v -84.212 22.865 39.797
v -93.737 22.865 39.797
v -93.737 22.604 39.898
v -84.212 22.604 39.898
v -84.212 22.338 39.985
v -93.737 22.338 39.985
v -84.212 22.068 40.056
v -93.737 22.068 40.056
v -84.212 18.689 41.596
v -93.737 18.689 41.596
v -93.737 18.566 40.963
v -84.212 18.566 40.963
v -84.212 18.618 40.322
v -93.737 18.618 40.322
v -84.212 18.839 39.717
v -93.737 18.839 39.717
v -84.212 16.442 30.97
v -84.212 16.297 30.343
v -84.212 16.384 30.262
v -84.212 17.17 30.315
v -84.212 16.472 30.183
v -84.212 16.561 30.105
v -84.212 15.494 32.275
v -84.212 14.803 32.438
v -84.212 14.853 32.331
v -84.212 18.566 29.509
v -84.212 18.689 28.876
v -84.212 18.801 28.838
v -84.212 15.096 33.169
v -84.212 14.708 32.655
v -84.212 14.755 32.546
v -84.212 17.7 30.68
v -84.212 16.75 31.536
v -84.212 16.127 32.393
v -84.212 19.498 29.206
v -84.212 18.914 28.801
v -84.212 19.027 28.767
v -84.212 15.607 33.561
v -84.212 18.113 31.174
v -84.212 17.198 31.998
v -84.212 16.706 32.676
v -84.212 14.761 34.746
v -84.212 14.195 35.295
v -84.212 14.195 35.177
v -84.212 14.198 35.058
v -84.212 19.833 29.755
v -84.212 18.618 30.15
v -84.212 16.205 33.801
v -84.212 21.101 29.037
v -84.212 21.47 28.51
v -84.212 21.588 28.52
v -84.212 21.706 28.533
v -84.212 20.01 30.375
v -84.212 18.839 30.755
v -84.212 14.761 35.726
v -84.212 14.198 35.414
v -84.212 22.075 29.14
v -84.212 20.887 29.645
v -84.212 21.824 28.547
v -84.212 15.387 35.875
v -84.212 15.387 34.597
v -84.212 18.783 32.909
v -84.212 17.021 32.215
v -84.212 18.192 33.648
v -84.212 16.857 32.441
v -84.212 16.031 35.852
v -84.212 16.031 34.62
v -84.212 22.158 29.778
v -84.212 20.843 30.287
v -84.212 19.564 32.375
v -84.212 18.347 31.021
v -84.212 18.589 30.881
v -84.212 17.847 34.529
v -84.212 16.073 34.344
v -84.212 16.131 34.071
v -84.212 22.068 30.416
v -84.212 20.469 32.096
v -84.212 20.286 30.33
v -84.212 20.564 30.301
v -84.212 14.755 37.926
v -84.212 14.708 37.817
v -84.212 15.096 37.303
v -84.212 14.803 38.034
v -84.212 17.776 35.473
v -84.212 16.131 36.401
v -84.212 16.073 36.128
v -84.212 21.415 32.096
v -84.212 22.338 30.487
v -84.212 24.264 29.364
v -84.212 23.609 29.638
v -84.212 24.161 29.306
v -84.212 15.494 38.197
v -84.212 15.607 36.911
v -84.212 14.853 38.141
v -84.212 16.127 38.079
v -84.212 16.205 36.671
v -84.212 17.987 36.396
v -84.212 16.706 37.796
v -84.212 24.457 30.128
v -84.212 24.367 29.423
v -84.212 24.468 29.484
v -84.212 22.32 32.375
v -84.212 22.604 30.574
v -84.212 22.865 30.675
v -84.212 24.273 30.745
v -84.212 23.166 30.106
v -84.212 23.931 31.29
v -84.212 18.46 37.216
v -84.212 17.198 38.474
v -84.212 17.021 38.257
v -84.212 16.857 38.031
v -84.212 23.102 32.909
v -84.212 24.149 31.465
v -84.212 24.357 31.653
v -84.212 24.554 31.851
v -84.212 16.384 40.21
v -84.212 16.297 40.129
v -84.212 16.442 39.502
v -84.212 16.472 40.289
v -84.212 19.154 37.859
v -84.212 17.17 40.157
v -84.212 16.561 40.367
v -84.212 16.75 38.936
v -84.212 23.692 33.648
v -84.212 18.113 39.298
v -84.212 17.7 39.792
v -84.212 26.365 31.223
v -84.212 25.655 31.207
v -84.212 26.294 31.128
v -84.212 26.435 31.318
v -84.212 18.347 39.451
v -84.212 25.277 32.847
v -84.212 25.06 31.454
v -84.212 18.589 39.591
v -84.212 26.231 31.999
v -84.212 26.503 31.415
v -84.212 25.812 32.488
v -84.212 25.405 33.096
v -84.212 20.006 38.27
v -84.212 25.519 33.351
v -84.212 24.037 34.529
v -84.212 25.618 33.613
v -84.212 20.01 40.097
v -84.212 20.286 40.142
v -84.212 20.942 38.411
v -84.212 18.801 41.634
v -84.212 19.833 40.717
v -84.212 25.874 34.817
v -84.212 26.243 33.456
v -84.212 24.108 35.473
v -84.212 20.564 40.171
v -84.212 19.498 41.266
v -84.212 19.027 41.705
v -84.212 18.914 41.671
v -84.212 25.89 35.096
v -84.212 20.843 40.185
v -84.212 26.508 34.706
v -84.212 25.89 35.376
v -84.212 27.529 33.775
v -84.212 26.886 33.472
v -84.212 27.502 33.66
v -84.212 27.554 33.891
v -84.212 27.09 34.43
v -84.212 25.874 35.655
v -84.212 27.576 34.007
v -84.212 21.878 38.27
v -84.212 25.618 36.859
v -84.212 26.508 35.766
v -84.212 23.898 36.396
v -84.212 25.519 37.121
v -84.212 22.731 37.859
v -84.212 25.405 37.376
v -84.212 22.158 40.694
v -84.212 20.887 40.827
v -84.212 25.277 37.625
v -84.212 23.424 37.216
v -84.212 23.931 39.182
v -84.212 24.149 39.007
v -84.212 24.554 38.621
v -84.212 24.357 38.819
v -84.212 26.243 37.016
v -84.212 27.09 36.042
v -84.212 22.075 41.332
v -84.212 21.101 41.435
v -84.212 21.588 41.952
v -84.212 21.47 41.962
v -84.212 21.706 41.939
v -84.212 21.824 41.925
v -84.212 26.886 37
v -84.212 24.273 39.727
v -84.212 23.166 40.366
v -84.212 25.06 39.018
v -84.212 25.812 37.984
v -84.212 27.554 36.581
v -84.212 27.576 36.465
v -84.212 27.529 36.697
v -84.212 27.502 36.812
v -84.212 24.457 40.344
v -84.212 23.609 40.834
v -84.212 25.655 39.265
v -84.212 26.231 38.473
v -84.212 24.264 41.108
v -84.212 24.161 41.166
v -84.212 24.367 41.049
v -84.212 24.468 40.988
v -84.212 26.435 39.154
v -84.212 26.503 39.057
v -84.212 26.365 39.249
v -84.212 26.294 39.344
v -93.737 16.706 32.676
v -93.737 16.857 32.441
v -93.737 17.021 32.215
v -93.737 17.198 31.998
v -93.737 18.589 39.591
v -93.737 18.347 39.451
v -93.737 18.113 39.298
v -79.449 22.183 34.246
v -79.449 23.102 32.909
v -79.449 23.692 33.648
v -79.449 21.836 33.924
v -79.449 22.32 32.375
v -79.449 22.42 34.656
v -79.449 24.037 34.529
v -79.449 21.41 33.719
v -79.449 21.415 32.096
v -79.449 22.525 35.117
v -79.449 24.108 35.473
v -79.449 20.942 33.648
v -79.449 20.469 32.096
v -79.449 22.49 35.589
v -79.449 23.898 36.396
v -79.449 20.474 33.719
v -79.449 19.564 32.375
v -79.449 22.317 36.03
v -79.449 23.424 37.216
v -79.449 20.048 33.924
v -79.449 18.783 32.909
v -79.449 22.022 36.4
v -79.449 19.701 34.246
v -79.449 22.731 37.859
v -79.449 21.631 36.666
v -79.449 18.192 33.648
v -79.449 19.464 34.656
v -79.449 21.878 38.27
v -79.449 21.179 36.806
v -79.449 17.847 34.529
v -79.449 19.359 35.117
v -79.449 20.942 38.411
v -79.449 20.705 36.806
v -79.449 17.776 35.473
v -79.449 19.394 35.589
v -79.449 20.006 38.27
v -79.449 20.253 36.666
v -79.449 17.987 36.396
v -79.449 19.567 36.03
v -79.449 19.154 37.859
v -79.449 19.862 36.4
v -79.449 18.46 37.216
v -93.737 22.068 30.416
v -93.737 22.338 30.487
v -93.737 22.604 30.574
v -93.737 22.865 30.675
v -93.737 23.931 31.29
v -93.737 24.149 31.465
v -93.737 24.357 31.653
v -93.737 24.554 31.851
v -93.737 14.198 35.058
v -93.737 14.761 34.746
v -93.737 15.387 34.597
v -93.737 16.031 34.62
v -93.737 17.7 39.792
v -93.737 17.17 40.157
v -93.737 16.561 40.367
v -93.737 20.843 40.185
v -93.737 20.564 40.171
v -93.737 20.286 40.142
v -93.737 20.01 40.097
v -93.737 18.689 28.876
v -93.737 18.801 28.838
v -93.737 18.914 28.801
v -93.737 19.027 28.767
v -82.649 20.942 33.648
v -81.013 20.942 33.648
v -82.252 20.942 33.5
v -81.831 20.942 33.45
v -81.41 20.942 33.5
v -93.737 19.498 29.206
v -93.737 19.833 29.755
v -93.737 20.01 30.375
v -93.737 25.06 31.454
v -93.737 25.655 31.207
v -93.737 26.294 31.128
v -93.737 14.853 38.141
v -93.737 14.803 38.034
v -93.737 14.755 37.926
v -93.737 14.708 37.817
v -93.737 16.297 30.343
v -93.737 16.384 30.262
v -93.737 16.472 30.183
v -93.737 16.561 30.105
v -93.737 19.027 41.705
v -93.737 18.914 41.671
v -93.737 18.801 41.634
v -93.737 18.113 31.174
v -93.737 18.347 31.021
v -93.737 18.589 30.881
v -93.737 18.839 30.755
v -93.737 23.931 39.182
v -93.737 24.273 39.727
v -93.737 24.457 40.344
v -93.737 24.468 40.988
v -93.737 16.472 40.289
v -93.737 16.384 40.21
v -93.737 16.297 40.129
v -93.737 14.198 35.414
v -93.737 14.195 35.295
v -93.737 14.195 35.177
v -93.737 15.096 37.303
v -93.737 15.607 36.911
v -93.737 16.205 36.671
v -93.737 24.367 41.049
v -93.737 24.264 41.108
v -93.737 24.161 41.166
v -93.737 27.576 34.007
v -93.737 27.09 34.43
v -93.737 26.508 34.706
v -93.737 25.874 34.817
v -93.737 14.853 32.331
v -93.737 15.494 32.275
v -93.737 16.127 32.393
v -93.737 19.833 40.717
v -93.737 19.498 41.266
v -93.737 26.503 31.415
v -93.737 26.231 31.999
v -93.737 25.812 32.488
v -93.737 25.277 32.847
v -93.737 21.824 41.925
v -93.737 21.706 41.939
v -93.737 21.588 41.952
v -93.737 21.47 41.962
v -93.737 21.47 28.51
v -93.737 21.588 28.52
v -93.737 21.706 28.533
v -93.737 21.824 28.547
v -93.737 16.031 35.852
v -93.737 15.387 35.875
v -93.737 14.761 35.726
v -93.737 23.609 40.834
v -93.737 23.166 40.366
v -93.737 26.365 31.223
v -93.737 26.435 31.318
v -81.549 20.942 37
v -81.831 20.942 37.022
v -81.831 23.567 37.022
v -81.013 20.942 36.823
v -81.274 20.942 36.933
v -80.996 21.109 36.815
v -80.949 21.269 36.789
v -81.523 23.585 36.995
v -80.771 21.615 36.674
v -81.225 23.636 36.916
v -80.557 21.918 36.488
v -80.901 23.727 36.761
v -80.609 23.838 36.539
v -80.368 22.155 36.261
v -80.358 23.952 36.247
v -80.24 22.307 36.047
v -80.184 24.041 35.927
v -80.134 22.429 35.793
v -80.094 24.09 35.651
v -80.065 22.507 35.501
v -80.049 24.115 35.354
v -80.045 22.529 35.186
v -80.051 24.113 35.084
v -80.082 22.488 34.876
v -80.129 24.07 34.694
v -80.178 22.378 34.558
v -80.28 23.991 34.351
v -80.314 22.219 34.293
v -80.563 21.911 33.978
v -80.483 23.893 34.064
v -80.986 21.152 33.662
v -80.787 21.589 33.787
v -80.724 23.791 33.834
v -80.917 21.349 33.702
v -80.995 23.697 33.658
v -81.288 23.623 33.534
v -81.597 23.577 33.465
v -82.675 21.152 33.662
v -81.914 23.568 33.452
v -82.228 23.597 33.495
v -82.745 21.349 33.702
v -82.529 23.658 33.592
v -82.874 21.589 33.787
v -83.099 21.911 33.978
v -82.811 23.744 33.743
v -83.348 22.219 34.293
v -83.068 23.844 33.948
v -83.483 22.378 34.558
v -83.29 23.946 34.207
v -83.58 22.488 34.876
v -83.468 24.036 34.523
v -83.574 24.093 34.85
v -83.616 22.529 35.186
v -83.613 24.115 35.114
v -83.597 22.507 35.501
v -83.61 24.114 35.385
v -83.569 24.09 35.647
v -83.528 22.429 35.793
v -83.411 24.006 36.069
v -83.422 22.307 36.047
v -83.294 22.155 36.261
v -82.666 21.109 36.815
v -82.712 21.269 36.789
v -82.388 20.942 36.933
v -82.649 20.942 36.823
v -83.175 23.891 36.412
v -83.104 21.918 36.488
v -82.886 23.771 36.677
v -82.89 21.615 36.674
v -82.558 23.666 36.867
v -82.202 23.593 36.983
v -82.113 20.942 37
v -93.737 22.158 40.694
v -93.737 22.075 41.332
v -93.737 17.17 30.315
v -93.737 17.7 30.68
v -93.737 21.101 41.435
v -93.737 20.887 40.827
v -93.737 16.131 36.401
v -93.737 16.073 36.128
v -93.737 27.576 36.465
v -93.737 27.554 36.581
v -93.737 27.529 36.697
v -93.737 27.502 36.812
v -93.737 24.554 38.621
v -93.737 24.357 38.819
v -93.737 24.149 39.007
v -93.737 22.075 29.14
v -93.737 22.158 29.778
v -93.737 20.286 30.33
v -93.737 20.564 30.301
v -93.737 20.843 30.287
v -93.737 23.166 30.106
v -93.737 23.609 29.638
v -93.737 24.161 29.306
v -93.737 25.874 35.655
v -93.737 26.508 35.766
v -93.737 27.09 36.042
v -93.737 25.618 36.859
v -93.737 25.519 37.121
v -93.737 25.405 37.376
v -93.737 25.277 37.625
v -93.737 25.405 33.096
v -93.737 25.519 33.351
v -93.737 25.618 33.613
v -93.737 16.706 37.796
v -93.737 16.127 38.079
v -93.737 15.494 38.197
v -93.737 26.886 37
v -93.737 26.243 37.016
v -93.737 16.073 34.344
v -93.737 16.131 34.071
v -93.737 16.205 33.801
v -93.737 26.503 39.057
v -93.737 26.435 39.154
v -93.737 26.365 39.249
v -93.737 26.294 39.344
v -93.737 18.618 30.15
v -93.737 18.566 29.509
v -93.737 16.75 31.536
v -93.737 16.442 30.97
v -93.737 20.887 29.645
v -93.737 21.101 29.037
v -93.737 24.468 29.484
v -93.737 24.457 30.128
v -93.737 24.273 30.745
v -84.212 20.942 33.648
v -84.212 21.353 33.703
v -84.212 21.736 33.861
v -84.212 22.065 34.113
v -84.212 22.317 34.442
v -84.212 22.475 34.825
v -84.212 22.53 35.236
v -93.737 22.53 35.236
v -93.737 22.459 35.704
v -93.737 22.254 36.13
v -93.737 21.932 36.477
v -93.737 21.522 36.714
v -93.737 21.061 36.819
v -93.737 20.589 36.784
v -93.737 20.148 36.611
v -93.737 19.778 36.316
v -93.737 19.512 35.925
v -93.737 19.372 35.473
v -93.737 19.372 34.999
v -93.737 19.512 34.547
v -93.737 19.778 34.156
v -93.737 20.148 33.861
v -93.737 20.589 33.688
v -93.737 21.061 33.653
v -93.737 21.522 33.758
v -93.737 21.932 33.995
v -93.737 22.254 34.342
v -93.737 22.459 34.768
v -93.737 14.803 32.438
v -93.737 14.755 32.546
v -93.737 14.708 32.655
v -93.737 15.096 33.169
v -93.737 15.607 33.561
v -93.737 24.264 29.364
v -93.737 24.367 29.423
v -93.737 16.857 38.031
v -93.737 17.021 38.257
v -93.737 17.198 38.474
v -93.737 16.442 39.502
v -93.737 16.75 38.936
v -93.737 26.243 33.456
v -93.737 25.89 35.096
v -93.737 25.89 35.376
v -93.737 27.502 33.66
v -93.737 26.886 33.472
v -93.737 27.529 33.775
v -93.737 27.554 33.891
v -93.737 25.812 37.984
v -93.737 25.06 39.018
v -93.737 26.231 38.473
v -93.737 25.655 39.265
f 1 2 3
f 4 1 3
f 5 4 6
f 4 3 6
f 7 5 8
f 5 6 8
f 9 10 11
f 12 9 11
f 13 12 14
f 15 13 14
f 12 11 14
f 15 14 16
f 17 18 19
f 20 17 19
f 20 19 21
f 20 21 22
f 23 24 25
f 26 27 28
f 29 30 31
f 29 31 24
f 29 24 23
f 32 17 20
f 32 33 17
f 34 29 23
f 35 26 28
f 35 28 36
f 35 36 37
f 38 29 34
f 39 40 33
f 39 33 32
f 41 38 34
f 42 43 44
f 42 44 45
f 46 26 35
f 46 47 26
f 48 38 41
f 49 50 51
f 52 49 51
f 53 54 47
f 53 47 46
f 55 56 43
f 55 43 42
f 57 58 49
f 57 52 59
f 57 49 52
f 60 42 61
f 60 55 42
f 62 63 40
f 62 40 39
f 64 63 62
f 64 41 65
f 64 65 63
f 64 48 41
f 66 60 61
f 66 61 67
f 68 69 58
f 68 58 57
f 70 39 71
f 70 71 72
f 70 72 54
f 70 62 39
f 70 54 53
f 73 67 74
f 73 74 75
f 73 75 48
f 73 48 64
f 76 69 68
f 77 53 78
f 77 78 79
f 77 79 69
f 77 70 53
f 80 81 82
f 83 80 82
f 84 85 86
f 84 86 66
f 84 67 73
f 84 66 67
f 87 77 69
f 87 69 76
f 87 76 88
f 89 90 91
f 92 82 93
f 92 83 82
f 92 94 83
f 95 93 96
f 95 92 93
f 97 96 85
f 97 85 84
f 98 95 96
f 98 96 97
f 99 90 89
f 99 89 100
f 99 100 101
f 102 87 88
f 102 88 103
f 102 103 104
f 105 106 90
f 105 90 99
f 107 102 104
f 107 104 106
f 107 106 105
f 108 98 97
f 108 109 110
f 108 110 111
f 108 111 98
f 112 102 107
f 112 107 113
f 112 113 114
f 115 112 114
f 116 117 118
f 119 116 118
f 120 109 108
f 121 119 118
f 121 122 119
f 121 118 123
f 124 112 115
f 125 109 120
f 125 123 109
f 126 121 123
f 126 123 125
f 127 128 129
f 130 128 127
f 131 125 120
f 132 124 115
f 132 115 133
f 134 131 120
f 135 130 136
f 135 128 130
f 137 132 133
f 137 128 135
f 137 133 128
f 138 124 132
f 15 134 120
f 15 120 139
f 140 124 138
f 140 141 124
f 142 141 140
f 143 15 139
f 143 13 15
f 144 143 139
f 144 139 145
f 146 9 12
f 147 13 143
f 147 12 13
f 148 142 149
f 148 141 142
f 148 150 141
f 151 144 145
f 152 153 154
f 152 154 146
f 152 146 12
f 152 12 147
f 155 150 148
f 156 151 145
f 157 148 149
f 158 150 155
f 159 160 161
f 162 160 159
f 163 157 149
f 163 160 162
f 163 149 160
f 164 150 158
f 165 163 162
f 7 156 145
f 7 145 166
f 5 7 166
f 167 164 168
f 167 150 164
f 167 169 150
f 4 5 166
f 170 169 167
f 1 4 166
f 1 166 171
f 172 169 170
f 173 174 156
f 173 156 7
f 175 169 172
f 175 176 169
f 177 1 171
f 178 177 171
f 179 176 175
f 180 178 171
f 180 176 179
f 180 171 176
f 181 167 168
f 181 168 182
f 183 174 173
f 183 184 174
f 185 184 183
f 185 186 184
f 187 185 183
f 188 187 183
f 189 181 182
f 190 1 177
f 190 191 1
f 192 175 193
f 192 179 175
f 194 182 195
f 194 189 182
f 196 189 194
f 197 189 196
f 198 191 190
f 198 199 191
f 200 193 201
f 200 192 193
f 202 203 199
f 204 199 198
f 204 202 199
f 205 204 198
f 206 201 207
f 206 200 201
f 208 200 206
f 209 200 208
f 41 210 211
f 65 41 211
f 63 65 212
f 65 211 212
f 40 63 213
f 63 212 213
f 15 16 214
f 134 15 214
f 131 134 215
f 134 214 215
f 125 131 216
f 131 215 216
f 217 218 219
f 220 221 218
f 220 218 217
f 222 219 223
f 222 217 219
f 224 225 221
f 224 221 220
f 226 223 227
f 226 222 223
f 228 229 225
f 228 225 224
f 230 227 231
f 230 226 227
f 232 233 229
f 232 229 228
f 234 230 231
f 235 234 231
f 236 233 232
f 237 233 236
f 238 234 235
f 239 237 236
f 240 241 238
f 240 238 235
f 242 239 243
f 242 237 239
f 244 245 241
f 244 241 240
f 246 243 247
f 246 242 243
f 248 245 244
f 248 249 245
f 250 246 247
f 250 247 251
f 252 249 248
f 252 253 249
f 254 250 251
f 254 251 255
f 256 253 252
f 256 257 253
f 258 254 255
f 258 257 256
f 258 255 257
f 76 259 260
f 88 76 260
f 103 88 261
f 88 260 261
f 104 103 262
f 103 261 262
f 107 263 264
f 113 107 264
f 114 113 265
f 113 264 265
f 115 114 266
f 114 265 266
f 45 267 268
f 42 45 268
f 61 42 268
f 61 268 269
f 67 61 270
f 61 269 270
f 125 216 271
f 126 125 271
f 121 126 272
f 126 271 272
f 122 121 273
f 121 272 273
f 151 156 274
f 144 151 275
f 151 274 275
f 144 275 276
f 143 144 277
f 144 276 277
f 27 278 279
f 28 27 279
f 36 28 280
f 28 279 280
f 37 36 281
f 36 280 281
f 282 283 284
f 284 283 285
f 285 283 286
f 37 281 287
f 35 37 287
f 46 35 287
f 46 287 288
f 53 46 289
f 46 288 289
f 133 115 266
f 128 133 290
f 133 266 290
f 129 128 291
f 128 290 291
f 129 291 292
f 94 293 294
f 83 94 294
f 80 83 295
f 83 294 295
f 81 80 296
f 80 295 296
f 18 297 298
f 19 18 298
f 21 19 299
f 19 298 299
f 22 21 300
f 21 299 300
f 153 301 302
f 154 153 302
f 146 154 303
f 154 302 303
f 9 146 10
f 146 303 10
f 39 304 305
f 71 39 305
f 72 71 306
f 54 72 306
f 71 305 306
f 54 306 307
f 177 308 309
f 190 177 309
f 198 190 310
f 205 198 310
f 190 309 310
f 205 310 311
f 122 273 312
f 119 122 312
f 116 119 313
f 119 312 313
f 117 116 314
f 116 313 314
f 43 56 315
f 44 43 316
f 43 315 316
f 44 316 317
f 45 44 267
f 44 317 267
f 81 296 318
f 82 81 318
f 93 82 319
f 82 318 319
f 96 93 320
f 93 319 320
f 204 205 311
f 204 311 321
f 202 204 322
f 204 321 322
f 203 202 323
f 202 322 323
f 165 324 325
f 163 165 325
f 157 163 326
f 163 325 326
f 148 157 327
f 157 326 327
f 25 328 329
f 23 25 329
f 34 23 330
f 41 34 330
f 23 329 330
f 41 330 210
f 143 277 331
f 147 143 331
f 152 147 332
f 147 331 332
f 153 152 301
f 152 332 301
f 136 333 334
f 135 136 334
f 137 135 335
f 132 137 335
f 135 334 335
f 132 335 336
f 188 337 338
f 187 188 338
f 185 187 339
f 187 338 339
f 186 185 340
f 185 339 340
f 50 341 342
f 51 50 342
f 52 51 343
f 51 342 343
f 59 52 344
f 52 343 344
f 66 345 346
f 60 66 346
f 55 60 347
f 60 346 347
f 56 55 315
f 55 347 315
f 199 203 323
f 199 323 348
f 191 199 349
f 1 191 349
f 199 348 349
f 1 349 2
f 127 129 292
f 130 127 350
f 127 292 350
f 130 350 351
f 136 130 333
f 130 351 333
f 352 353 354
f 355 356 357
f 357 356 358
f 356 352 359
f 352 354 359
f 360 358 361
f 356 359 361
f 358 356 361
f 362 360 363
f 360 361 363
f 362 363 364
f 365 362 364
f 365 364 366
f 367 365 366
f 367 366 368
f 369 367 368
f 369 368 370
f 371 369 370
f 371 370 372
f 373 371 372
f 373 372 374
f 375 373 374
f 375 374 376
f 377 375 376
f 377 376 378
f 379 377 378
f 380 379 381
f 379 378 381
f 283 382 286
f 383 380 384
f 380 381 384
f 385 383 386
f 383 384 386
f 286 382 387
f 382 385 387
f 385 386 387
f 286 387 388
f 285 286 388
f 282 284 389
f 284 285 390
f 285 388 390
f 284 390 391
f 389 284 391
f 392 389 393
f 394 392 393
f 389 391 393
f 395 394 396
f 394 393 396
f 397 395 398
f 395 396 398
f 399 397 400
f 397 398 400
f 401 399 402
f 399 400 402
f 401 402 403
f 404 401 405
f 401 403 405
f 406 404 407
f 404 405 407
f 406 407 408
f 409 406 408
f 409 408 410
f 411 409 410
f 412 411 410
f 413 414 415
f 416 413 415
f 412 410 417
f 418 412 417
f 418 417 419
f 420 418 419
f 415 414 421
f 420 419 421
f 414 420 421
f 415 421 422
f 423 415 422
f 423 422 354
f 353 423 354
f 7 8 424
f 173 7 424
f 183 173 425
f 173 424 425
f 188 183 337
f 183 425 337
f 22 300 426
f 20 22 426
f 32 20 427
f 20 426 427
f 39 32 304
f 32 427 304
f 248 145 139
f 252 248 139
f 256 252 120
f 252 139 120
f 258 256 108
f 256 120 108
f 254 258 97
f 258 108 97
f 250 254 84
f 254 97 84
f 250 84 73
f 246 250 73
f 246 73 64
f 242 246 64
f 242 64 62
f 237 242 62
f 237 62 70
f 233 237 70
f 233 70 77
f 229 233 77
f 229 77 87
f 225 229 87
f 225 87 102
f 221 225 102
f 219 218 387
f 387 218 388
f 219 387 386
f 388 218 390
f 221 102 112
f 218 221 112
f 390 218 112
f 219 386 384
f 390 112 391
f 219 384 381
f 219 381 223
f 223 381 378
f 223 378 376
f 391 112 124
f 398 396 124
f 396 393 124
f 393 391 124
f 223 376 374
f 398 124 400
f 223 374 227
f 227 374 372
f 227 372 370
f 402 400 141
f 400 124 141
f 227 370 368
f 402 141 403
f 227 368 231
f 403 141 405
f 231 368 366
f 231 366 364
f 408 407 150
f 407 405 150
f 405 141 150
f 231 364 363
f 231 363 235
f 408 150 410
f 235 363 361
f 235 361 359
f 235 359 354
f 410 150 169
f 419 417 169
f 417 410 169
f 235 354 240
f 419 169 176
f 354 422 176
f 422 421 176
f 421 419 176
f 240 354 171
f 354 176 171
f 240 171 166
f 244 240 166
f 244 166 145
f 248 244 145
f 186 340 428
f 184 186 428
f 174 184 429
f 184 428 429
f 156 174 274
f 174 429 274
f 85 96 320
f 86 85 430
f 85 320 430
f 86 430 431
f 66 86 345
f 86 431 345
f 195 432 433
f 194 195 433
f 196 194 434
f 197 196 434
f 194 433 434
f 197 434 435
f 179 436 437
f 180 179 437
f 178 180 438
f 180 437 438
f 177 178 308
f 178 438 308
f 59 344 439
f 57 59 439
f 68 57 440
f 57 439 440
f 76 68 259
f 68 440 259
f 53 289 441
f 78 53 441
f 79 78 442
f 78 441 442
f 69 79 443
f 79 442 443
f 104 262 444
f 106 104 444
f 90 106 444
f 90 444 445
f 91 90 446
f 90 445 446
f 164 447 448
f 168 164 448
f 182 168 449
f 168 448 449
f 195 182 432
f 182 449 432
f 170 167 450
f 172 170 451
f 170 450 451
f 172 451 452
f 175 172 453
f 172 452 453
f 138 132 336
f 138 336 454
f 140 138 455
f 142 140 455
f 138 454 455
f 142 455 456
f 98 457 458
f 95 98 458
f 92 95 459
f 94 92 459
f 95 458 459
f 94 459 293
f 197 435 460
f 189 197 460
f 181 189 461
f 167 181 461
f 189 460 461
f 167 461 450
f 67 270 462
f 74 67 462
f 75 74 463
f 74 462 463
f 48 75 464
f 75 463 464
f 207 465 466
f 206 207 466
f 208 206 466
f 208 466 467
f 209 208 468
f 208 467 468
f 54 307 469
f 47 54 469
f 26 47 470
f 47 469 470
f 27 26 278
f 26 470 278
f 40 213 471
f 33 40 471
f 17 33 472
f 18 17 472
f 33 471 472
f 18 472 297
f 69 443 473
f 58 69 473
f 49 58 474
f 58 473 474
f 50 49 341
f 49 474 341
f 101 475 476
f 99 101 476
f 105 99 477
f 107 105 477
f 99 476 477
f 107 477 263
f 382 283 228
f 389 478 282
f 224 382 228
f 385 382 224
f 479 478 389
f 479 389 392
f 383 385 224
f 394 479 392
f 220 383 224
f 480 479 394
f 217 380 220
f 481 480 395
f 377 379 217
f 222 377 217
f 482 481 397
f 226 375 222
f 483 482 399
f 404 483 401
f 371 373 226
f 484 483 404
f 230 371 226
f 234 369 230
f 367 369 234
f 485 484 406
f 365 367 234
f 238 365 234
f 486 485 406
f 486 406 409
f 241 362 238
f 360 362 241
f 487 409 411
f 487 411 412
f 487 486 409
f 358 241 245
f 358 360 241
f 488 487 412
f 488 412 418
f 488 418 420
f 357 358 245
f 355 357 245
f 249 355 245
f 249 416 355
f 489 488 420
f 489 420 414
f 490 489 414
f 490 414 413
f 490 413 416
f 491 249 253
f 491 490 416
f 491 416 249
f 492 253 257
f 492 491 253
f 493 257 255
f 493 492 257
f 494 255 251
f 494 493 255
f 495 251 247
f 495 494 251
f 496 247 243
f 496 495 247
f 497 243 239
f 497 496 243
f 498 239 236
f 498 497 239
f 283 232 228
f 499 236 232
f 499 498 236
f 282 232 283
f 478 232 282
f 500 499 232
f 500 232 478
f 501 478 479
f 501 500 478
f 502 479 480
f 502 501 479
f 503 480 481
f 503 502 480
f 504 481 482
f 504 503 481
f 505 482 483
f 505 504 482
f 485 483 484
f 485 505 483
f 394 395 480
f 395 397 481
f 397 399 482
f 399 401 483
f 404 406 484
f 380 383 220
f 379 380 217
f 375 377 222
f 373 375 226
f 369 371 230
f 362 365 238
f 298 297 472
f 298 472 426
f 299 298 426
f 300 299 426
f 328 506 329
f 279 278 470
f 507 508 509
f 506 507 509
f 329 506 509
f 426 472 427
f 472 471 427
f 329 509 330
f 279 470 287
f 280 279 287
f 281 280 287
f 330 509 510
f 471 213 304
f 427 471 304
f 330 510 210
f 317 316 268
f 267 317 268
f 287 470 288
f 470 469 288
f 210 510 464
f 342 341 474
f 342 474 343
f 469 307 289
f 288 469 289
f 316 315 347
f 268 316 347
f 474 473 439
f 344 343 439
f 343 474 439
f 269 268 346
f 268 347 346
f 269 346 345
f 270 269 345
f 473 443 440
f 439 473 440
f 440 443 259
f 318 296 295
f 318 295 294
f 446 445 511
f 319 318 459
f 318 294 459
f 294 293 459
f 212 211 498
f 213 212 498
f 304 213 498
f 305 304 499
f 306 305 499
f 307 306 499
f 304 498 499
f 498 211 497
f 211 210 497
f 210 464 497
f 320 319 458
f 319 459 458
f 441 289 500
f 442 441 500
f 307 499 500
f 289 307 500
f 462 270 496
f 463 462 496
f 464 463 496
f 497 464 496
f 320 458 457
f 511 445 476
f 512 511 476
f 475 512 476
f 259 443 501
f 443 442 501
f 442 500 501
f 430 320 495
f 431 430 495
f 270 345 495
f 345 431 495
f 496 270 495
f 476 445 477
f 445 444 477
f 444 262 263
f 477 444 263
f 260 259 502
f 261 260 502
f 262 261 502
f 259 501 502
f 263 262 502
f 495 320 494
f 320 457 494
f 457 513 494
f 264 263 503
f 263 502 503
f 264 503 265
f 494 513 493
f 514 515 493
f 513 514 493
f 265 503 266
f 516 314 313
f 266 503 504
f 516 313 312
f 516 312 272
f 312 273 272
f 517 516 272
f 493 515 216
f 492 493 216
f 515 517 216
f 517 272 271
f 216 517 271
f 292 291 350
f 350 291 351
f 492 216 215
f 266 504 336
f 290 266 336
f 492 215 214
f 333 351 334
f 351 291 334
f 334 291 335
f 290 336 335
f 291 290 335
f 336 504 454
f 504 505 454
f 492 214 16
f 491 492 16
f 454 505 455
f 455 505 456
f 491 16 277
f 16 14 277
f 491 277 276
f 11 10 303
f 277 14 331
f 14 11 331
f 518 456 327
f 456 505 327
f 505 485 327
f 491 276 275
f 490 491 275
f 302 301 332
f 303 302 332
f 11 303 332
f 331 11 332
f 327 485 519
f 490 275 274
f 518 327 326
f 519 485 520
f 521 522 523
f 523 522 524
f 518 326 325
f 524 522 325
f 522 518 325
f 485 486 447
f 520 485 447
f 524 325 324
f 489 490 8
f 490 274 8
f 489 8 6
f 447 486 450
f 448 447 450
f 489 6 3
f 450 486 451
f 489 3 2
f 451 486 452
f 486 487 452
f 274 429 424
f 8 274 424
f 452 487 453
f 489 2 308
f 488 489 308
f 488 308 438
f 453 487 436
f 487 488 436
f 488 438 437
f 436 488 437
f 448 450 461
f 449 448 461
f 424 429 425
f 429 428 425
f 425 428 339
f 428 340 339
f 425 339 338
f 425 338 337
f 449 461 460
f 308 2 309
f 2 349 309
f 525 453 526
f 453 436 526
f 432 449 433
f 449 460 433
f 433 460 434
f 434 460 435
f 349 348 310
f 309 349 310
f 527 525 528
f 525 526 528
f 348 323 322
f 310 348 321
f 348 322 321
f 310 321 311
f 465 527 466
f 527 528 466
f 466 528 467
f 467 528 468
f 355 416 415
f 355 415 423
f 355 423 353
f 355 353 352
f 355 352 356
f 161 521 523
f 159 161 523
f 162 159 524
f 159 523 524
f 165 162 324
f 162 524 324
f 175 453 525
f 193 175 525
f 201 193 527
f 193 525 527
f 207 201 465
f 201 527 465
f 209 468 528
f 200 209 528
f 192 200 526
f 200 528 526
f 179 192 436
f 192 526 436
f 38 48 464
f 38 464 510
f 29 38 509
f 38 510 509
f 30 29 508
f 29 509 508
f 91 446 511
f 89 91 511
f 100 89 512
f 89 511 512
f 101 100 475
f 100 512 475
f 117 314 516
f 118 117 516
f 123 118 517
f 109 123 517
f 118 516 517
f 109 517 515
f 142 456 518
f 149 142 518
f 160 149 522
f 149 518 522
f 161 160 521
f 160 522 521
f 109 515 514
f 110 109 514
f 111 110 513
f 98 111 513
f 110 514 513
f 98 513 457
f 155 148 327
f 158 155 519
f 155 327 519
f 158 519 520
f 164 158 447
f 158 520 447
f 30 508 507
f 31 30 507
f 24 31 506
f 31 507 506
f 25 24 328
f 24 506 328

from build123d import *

# Parameters (mm, degrees)
SPUR_START             = -93.736960043
SPUR_GEAR_AI_OUTLINE_R = 1.5875
SPUR_GEAR_AI_DEPTH     = 9.525
SKETCH1_R              = 3.175
SKETCH1_R_2            = 1.5875
BOSS_EXTRUDE1_DEPTH    = 4.7625
SKETCH2_R              = 1.7859375
CUT_EXTRUDE1_DEPTH     = 3.175


# Read off the part's stored shape, not the designer's step: spur gear_ai
with BuildPart() as part:
    # spur gear_ai outline → spur gear_ai (new body)
    with BuildSketch(Plane.YZ.offset(SPUR_START)):
        with BuildLine():
            ThreePointArc((26.294144563, 31.128016902), (26.400392113, 31.270279151), (26.502859253, 31.415288028))
            ThreePointArc((26.502859253, 31.415288028), (26.037760207, 32.257629699), (25.277278274, 32.847141228))
            ThreePointArc((25.277278274, 32.847141228), (25.463945724, 33.222717571), (25.618148436, 33.612748146))
            ThreePointArc((25.618148436, 33.612748146), (26.565102615, 33.44206014), (27.502296476, 33.660060783))
            ThreePointArc((27.502296476, 33.660060783), (27.541495173, 33.833238586), (27.576123139, 34.007387928))
            ThreePointArc((27.576123139, 34.007387928), (26.808622795, 34.58773251), (25.874112039, 34.816962221))
            ThreePointArc((25.874112039, 34.816962221), (25.891880579, 35.235992775), (25.874112039, 35.655023329))
            ThreePointArc((25.874112039, 35.655023329), (26.808622795, 35.88425304), (27.576123139, 36.464597623))
            ThreePointArc((27.576123139, 36.464597623), (27.541495173, 36.638746964), (27.502296476, 36.811924767))
            ThreePointArc((27.502296476, 36.811924767), (26.565102615, 37.029925411), (25.618148436, 36.859237404))
            ThreePointArc((25.618148436, 36.859237404), (25.463945724, 37.249267979), (25.277278274, 37.624844322))
            ThreePointArc((25.277278274, 37.624844322), (26.037760207, 38.214355851), (26.502859253, 39.056697522))
            ThreePointArc((26.502859253, 39.056697522), (26.400392113, 39.201706399), (26.294144563, 39.343968648))
            ThreePointArc((26.294144563, 39.343968648), (25.349306519, 39.161931061), (24.553645896, 38.620838844))
            ThreePointArc((24.553645896, 38.620838844), (24.254134982, 38.914429611), (23.930845121, 39.181611181))
            ThreePointArc((23.930845121, 39.181611181), (24.385803996, 40.029472629), (24.468081893, 40.988162861))
            ThreePointArc((24.468081893, 40.988162861), (24.315493079, 41.078957921), (24.160567843, 41.165706181))
            ThreePointArc((24.160567843, 41.165706181), (23.371456696, 40.615106316), (22.864666581, 39.797169648))
            ThreePointArc((22.864666581, 39.797169648), (22.471635623, 39.943556096), (22.067623104, 40.056144773))
            ThreePointArc((22.067623104, 40.056144773), (22.138392398, 41.015753193), (21.823622551, 41.925025735))
            ThreePointArc((21.823622551, 41.925025735), (21.647296055, 41.945907688), (21.470481113, 41.962142396))
            ThreePointArc((21.470481113, 41.962142396), (20.97354135, 41.138183972), (20.843250357, 40.184831534))
            ThreePointArc((20.843250357, 40.184831534), (20.424657978, 40.158702116), (20.009780236, 40.097230294))
            ThreePointArc((20.009780236, 40.097230294), (19.684123296, 41.002660673), (19.02673227, 41.705294043))
            ThreePointArc((19.02673227, 41.705294043), (18.857156545, 41.652652209), (18.689024808, 41.595566237))
            ThreePointArc((18.689024808, 41.595566237), (18.570181828, 40.64071915), (18.838918453, 39.716794239))
            ThreePointArc((18.838918453, 39.716794239), (18.467143079, 39.522666969), (18.113136244, 39.297763686))
            ThreePointArc((18.113136244, 39.297763686), (17.447362113, 39.992458885), (16.56101879, 40.366961389))
            ThreePointArc((16.56101879, 40.366961389), (16.427515019, 40.24989802), (16.297137991, 40.129362051))
            ThreePointArc((16.297137991, 40.129362051), (16.576940826, 39.208728037), (17.198238065, 38.473985665))
            ThreePointArc((17.198238065, 38.473985665), (16.937563035, 38.145426912), (16.705638106, 37.795979987))
            ThreePointArc((16.705638106, 37.795979987), (15.81486518, 38.159820895), (14.852826371, 38.141437649))
            ThreePointArc((14.852826371, 38.141437649), (14.778478569, 37.980194064), (14.708399623, 37.817049862))
            ThreePointArc((14.708399623, 37.817049862), (15.33846782, 37.089814907), (16.204897737, 36.671298704))
            ThreePointArc((16.204897737, 36.671298704), (16.100396131, 36.26511926), (16.030655035, 35.851551242))
            ThreePointArc((16.030655035, 35.851551242), (15.068906044, 35.821626462), (14.197517, 35.413536095))
            ThreePointArc((14.197517, 35.413536095), (14.195180579, 35.235992775), (14.197517, 35.058449455))
            ThreePointArc((14.197517, 35.058449455), (15.068906044, 34.650359089), (16.030655035, 34.620434308))
            ThreePointArc((16.030655035, 34.620434308), (16.100396131, 34.20686629), (16.204897737, 33.800686847))
            ThreePointArc((16.204897737, 33.800686847), (15.33846782, 33.382170643), (14.708399623, 32.654935688))
            ThreePointArc((14.708399623, 32.654935688), (14.778478569, 32.491791486), (14.852826371, 32.330547901))
            ThreePointArc((14.852826371, 32.330547901), (15.81486518, 32.312164655), (16.705638106, 32.676005564))
            ThreePointArc((16.705638106, 32.676005564), (16.937563035, 32.326558639), (17.198238065, 31.997999885))
            ThreePointArc((17.198238065, 31.997999885), (16.576940826, 31.263257513), (16.297137991, 30.3426235))
            ThreePointArc((16.297137991, 30.3426235), (16.427515019, 30.222087531), (16.56101879, 30.105024161))
            ThreePointArc((16.56101879, 30.105024161), (17.447362114, 30.479526665), (18.113136244, 31.174221865))
            ThreePointArc((18.113136244, 31.174221865), (18.467143079, 30.949318581), (18.838918453, 30.755191311))
            ThreePointArc((18.838918453, 30.755191311), (18.570181828, 29.831266401), (18.689024808, 28.876419314))
            ThreePointArc((18.689024808, 28.876419314), (18.857156545, 28.819333342), (19.02673227, 28.766691508))
            ThreePointArc((19.02673227, 28.766691508), (19.684123296, 29.469324877), (20.009780236, 30.374755256))
            ThreePointArc((20.009780236, 30.374755256), (20.424657978, 30.313283434), (20.843250357, 30.287154017))
            ThreePointArc((20.843250357, 30.287154017), (20.97354135, 29.333801579), (21.470481113, 28.509843154))
            ThreePointArc((21.470481113, 28.509843154), (21.647296055, 28.526077862), (21.823622551, 28.546959815))
            ThreePointArc((21.823622551, 28.546959815), (22.138392398, 29.456232358), (22.067623104, 30.415840778))
            ThreePointArc((22.067623104, 30.415840778), (22.471635623, 30.528429454), (22.864666581, 30.674815902))
            ThreePointArc((22.864666581, 30.674815902), (23.371456696, 29.856879235), (24.160567843, 29.30627937))
            ThreePointArc((24.160567843, 29.30627937), (24.315493079, 29.393027629), (24.468081893, 29.483822689))
            ThreePointArc((24.468081893, 29.483822689), (24.385803996, 30.442512921), (23.930845121, 31.290374369))
            ThreePointArc((23.930845121, 31.290374369), (24.254134982, 31.557555939), (24.553645896, 31.851146706))
            ThreePointArc((24.553645896, 31.851146706), (25.349306519, 31.310054489), (26.294144563, 31.128016902))
        make_face()
        with Locations((20.942055579, 35.235992775)):
            Circle(SPUR_GEAR_AI_OUTLINE_R, mode=Mode.SUBTRACT)
    extrude(amount=SPUR_GEAR_AI_DEPTH)

    # Sketch1 → Boss-Extrude1 (add)
    with BuildSketch(Plane(origin=(-84.211960043, 0, 0), x_dir=(0, 0, -1), z_dir=(1, 0, 0))):
        with Locations(Location((-35.235992775, 20.942055579, 0), (0, 0, 180))):
            Circle(SKETCH1_R)
        with Locations((-35.235992775, 20.942055579)):
            Circle(SKETCH1_R_2, mode=Mode.SUBTRACT)
    extrude(amount=BOSS_EXTRUDE1_DEPTH)

    # Sketch2 → Cut-Extrude1 (cut)
    with BuildSketch(Plane(origin=(0, 24.117055579, 0), x_dir=(1, 0, 0), z_dir=(0, 1, 0))):
        with Locations(Location((-81.830710043, -35.235992775, 0), (0, 0, 270))):
            Circle(SKETCH2_R)
    extrude(amount=-CUT_EXTRUDE1_DEPTH, mode=Mode.SUBTRACT)


solid = part.part
